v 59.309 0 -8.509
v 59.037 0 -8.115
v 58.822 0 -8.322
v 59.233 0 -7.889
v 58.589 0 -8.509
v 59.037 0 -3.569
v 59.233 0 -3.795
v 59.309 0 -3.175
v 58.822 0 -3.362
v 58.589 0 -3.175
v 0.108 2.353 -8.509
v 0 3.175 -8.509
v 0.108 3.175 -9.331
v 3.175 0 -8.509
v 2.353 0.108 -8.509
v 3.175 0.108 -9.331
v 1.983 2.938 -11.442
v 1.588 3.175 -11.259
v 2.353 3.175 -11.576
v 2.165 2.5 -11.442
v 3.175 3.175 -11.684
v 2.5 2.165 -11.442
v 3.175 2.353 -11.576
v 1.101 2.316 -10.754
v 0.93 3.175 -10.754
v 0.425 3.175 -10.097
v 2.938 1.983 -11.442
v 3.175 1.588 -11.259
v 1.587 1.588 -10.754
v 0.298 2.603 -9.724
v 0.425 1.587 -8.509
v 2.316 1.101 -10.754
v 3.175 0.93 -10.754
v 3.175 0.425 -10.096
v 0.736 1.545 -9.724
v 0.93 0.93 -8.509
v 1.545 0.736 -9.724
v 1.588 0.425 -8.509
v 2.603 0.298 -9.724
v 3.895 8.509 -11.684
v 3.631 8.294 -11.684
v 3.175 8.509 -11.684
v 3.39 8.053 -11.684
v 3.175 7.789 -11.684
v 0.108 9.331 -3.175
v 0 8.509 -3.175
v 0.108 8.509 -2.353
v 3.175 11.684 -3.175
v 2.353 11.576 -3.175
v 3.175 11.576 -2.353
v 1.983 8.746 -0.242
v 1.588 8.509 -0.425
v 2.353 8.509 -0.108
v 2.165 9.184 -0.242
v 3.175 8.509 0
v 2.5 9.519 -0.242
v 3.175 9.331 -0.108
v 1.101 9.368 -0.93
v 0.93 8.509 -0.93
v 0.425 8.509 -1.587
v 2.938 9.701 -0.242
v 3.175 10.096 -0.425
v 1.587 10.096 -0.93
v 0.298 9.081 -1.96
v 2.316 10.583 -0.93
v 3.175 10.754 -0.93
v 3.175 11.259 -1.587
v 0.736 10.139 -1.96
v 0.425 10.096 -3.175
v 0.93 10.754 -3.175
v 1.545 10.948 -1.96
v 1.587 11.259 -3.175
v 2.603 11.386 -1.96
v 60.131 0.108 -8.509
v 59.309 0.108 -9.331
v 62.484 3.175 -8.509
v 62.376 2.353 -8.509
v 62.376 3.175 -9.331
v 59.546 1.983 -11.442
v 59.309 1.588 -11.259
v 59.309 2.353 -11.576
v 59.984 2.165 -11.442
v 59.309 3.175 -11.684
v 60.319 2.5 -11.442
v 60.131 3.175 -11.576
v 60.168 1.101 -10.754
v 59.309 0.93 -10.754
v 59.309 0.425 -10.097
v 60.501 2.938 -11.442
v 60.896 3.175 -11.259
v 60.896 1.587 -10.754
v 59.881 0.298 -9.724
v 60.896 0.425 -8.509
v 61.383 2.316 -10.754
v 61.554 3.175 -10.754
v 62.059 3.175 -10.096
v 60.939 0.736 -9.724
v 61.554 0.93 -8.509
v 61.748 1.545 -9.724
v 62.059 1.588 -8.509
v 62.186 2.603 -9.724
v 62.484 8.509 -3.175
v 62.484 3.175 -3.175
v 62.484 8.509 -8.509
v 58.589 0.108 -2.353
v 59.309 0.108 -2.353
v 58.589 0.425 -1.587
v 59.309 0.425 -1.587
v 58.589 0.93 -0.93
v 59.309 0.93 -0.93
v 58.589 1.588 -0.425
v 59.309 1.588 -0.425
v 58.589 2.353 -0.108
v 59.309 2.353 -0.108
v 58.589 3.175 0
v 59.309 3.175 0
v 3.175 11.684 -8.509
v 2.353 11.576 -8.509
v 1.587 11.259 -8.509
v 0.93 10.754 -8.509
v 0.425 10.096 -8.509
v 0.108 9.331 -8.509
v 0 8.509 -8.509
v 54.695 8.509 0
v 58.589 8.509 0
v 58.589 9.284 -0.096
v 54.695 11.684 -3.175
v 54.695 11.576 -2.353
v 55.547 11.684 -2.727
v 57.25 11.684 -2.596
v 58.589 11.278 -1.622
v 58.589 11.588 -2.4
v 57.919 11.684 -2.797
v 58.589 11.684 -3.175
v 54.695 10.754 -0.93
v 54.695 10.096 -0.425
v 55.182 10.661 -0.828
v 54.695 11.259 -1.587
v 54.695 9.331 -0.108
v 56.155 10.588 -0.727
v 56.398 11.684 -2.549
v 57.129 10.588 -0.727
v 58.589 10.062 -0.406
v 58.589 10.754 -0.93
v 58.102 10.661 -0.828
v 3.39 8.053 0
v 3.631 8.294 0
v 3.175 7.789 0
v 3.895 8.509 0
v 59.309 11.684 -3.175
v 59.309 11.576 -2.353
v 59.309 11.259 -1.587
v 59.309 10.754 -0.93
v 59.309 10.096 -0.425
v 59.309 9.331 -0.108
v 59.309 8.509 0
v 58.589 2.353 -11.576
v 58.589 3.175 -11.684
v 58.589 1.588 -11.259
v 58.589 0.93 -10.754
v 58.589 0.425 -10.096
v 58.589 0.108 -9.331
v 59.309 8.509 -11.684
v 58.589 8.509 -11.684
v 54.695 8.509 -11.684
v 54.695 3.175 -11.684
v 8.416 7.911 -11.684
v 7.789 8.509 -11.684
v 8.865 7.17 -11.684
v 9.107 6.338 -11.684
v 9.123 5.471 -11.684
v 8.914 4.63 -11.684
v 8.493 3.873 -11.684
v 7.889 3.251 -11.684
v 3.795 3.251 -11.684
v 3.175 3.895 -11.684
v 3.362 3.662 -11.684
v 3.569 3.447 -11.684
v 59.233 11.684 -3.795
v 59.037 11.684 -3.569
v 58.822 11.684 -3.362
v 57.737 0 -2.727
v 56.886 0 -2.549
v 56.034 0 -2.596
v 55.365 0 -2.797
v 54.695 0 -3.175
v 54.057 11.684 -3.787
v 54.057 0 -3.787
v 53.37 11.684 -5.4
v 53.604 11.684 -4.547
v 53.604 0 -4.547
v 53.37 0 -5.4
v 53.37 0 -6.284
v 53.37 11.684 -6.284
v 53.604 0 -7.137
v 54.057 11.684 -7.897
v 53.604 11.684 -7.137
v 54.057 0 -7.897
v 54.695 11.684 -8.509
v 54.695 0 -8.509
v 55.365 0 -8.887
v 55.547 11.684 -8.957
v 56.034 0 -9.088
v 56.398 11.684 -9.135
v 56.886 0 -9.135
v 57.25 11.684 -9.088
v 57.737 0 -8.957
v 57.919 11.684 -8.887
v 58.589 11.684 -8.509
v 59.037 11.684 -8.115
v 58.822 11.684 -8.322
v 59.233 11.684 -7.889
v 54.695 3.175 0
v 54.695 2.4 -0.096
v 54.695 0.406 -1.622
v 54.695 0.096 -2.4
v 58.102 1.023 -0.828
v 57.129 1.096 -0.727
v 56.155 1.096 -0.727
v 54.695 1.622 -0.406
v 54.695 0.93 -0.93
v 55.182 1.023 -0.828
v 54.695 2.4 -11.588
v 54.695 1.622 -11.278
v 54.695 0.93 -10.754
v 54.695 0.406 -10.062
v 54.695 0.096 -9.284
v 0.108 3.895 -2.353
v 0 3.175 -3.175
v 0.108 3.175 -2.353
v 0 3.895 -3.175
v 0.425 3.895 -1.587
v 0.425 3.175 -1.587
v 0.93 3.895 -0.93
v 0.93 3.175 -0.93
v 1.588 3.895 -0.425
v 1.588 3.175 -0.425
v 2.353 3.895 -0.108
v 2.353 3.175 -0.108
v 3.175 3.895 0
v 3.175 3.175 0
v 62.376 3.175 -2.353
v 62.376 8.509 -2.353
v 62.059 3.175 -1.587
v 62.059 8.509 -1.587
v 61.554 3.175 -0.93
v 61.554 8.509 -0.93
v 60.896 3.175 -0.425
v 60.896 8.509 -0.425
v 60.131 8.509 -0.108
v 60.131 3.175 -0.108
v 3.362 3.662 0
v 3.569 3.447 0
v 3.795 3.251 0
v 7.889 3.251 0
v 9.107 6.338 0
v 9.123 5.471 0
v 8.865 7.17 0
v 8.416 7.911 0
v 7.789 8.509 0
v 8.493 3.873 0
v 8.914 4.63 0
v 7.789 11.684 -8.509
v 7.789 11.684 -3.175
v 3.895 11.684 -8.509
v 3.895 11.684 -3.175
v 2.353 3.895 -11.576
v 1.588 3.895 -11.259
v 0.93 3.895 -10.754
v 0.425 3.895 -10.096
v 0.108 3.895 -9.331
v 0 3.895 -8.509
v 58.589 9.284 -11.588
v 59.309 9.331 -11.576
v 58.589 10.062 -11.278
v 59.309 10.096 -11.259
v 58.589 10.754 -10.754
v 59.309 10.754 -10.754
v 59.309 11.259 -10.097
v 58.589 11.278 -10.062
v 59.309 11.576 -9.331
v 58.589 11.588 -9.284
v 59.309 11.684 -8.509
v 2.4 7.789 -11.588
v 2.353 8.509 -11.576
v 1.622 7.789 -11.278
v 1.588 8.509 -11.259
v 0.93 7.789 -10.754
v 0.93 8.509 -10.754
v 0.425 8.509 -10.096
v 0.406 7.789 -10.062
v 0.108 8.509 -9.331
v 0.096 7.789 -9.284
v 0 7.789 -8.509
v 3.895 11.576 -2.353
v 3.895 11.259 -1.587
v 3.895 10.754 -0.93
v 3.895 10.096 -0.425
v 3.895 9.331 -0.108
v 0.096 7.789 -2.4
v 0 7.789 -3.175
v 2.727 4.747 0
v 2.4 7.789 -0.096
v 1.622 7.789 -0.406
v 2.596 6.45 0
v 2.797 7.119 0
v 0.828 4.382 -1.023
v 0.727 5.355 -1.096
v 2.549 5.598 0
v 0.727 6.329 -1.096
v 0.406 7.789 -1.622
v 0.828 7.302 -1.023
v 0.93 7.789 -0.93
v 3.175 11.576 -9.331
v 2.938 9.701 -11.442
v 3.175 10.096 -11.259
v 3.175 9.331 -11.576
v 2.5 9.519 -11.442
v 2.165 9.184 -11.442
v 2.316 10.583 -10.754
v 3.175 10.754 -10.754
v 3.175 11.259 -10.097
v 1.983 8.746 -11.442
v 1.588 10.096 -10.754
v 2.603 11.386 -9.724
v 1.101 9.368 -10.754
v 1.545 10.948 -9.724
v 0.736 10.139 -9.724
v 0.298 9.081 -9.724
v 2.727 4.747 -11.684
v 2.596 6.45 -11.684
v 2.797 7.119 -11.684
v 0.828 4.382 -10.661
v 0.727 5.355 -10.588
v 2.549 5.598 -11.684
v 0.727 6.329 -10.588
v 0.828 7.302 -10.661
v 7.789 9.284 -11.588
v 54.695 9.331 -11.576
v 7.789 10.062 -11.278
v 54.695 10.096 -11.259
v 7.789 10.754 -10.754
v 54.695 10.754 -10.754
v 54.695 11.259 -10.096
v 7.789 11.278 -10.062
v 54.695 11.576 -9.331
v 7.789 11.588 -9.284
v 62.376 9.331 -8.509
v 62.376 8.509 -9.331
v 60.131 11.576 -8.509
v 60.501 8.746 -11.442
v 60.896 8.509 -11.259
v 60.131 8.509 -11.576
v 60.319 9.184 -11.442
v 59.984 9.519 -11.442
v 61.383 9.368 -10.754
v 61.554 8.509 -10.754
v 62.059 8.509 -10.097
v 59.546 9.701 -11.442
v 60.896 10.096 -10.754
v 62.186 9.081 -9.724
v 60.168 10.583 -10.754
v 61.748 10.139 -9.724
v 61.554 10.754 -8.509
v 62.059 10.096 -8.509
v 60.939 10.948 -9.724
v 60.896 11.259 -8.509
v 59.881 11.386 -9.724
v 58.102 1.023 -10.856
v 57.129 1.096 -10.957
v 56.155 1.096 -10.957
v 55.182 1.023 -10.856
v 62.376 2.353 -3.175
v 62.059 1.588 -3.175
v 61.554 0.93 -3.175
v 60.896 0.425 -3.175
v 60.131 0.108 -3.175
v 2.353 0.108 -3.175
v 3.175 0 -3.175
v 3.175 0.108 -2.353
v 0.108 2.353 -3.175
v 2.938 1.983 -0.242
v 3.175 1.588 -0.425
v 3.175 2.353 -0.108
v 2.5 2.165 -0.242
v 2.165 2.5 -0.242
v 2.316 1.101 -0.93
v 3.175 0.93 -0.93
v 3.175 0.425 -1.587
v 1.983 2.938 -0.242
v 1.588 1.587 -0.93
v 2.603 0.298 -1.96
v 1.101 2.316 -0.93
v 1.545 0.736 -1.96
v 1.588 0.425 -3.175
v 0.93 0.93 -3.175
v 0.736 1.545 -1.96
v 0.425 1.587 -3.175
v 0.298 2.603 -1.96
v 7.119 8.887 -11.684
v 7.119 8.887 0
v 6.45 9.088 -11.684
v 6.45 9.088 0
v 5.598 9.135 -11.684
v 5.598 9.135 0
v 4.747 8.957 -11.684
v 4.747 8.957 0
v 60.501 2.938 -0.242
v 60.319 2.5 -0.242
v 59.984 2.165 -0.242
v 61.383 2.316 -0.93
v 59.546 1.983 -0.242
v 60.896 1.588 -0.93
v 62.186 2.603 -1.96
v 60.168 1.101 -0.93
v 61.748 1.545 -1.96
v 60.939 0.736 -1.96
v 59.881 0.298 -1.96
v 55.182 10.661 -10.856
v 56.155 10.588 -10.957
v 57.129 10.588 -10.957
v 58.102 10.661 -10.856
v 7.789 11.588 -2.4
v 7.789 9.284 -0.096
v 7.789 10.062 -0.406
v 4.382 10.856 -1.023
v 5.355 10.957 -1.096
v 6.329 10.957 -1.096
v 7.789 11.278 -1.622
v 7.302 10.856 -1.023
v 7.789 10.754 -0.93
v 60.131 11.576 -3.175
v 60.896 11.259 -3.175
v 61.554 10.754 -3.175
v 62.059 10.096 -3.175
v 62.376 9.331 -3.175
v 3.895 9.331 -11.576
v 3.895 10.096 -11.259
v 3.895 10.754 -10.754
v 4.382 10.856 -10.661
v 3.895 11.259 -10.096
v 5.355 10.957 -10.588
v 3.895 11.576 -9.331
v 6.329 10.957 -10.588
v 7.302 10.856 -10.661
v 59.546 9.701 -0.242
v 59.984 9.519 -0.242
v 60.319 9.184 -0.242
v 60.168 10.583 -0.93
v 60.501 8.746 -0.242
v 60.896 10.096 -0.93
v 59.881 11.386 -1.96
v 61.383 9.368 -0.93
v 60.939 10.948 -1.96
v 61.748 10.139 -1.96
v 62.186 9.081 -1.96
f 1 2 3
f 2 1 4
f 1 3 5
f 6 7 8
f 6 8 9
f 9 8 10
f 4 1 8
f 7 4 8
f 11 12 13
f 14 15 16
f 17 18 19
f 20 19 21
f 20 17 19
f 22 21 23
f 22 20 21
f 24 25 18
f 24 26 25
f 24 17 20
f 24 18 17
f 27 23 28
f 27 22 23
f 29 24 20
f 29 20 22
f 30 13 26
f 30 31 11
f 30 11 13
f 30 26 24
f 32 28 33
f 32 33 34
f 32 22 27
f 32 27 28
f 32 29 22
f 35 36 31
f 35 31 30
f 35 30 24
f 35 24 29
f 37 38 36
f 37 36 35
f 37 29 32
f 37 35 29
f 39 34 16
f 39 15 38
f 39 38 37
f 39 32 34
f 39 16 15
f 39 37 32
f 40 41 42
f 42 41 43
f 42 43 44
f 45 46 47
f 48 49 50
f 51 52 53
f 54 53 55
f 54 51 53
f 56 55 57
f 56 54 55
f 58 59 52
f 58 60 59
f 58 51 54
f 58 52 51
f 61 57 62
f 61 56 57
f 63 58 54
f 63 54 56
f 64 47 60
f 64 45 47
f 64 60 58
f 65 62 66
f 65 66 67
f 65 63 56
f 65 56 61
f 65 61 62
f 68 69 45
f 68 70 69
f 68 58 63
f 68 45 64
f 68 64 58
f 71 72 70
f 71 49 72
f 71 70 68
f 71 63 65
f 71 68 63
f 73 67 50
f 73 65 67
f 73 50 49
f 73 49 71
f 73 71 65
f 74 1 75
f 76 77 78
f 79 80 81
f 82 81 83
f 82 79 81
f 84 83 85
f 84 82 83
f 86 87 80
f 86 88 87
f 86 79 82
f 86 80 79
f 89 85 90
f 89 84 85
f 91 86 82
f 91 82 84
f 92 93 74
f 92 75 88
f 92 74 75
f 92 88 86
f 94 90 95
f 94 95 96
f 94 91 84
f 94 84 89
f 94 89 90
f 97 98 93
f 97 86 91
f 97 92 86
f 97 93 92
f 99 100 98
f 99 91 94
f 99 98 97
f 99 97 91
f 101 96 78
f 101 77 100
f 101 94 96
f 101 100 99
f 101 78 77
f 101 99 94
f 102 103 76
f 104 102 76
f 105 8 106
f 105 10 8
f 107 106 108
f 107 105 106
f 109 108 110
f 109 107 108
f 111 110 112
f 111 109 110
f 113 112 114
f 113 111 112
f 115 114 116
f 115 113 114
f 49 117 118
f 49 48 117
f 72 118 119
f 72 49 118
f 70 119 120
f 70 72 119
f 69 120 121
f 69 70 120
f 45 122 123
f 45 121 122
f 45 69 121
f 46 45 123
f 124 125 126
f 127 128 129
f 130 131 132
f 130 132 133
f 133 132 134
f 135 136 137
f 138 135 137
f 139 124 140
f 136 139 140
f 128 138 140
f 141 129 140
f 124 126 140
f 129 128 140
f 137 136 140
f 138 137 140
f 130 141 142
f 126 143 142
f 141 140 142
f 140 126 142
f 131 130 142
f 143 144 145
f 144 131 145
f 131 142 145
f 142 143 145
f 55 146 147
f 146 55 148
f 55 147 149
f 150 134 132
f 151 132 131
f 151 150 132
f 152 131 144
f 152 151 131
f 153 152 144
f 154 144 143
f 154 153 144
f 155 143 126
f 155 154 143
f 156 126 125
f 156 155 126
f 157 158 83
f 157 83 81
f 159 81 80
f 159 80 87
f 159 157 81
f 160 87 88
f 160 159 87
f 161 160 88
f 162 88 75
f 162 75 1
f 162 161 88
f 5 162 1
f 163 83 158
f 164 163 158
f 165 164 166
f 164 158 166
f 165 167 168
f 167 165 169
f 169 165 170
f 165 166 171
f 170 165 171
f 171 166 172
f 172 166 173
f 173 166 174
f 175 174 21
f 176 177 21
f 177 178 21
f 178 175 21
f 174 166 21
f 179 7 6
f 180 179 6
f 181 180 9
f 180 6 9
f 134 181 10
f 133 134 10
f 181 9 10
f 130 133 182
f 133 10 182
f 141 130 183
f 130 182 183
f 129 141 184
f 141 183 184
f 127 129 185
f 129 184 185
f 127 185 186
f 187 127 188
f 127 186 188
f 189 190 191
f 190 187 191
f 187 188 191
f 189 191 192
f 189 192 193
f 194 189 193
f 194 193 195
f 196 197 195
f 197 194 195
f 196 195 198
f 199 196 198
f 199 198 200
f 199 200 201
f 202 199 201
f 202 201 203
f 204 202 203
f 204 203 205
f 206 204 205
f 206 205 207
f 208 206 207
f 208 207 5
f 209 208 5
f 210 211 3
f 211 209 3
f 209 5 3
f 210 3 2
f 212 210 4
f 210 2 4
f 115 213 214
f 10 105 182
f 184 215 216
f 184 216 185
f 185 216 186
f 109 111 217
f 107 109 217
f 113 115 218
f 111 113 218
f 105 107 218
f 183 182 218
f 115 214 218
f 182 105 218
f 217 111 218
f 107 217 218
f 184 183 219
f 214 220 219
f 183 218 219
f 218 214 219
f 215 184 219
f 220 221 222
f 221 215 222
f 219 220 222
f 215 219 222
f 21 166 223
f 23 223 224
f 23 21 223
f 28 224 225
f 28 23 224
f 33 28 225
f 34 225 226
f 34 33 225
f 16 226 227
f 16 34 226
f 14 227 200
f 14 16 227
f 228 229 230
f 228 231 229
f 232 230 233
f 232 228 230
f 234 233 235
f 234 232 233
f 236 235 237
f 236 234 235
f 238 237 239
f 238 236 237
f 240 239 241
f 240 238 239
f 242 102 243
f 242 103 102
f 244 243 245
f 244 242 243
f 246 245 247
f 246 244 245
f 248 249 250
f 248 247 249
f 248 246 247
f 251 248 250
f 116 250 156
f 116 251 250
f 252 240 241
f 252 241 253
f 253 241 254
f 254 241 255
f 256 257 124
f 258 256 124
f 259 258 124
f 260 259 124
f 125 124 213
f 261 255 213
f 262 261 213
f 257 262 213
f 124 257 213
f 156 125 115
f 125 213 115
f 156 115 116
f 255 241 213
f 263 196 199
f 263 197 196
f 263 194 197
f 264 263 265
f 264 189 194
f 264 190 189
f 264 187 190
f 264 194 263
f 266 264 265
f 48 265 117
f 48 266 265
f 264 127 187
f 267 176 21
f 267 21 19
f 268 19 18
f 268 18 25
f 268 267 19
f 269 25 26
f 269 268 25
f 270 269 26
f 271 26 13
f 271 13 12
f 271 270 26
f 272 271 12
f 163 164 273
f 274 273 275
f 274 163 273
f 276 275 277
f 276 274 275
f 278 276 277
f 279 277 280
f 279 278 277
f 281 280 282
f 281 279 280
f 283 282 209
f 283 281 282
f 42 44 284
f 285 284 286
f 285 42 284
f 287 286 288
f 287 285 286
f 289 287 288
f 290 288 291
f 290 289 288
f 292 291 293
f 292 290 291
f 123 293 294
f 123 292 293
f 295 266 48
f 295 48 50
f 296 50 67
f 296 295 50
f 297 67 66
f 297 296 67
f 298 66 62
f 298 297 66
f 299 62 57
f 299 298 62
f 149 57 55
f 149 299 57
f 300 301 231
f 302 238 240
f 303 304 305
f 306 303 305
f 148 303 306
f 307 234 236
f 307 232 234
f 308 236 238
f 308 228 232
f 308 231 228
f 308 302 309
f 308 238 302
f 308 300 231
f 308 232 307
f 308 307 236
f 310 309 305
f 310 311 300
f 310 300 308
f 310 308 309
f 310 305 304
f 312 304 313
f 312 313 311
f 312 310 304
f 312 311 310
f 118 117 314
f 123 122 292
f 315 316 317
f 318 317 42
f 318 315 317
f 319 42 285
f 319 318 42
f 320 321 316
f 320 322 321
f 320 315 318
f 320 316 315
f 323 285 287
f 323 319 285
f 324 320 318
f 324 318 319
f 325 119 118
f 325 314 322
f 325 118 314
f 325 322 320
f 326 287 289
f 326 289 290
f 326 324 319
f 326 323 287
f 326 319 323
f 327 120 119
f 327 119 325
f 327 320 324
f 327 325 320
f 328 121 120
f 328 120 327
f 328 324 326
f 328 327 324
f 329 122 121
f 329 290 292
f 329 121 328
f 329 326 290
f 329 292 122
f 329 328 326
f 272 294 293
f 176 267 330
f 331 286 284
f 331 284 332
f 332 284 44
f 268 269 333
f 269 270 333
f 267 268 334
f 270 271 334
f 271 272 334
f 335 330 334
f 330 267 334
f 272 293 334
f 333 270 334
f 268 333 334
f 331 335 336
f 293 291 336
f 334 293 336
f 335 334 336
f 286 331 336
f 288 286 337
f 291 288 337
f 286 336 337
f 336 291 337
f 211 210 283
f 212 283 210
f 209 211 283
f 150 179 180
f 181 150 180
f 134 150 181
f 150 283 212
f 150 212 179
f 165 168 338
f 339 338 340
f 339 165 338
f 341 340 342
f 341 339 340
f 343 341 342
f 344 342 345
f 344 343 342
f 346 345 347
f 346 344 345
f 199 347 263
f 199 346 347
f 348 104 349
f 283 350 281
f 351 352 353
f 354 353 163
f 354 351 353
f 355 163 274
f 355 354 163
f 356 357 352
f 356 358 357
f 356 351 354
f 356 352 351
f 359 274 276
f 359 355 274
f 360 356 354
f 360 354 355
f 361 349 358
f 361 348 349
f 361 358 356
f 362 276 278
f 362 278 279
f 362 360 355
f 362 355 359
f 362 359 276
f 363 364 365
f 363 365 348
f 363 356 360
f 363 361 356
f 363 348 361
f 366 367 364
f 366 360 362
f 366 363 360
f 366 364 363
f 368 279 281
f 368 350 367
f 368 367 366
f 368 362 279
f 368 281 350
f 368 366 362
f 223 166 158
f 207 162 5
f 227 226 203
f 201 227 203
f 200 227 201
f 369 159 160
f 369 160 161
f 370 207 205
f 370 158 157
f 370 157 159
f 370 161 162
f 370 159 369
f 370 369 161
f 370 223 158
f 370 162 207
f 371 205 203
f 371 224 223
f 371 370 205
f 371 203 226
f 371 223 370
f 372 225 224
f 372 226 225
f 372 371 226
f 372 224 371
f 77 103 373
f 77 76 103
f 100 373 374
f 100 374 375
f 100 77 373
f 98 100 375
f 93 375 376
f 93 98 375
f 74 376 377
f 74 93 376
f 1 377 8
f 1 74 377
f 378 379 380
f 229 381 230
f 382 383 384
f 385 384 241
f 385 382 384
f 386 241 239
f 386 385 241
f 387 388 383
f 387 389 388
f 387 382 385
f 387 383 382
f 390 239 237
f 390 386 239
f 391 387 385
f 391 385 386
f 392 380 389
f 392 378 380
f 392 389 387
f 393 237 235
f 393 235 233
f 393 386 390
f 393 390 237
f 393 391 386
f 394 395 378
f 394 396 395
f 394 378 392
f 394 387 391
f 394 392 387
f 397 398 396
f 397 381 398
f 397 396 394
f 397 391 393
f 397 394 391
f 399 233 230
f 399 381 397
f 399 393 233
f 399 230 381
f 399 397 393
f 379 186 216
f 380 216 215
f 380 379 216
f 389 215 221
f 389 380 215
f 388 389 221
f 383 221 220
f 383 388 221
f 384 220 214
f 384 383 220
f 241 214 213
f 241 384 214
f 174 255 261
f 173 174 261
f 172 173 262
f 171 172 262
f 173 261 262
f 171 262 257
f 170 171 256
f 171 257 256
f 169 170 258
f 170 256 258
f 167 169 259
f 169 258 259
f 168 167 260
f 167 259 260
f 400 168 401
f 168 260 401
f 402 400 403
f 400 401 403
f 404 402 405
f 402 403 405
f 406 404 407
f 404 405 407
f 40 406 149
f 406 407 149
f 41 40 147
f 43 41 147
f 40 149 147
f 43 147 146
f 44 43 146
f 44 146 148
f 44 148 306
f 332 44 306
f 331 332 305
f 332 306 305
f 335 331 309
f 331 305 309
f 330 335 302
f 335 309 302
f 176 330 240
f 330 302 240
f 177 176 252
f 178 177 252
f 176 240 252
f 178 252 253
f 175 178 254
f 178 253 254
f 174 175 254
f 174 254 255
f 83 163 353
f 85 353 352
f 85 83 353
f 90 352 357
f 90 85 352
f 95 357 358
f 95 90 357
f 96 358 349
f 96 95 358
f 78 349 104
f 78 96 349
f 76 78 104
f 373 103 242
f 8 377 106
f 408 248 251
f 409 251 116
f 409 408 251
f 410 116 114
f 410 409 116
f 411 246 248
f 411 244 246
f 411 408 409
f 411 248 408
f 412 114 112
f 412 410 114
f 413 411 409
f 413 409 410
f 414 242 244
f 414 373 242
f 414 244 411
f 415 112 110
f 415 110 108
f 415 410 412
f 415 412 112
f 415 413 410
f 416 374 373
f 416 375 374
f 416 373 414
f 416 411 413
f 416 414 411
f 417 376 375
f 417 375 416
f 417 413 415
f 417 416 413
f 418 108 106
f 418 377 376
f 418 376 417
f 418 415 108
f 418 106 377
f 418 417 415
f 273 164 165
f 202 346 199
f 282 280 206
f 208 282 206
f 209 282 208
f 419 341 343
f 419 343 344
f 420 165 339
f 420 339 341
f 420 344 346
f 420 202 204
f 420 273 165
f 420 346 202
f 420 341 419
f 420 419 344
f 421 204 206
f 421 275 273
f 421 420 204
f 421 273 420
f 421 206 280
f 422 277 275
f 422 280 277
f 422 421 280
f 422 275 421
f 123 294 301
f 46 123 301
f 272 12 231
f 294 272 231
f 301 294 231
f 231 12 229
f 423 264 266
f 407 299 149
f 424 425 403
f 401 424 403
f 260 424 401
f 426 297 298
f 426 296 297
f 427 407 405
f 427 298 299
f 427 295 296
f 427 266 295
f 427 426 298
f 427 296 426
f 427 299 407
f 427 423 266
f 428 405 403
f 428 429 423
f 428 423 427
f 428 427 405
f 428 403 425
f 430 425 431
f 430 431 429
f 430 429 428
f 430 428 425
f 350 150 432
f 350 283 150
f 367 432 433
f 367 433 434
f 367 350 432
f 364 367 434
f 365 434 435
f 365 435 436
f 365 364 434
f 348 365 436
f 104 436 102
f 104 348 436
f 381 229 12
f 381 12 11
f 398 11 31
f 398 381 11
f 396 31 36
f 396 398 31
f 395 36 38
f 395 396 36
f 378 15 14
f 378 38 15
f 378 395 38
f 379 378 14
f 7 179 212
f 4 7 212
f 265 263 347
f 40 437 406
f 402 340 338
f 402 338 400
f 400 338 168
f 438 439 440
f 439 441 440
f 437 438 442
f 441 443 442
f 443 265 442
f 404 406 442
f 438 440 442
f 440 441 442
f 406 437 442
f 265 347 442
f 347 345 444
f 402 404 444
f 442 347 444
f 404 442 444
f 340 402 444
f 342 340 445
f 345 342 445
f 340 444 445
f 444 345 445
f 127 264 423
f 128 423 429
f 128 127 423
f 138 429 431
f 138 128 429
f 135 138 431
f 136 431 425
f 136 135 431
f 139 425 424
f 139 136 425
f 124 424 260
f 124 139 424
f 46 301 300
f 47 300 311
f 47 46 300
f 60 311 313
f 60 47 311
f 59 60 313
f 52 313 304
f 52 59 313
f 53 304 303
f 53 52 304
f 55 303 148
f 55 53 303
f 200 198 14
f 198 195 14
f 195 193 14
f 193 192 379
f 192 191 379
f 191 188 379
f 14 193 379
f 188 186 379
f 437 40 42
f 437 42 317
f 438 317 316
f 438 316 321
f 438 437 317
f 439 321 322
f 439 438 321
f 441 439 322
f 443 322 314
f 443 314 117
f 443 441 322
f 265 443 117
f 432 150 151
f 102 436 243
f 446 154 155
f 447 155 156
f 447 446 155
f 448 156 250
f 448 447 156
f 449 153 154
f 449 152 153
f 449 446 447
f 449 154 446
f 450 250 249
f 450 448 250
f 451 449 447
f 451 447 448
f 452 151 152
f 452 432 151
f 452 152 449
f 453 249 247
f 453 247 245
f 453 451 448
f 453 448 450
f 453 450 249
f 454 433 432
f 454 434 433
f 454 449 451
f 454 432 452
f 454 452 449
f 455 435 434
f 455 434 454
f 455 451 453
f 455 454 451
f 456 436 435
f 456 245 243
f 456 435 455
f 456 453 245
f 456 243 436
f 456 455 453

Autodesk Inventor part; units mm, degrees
ref_plane "YZ Plane" through (0, 0, 0) normal (1, 0, 0) x (0, 1, 0)
ref_plane "XZ Plane" through (0, 0, 0) normal (0, 1, 0) x (-1, 0, 0)
ref_plane "XY Plane" through (0, 0, 0) normal (0, 0, 1) x (1, 0, 0)
sketch "Sketch1" plane through (0, 0, 0) normal (0, 1, 0) x (-1, 0, 0)
  line L0 (0, 0) -> (-62.484, 0)
  line L1 (-62.484, 0) -> (-62.484, -11.684)
  line L2 (-62.484, -11.684) -> (0, -11.684)
  line L3 (0, -11.684) -> (0, 0)
  arc A0 (-59.2328, -7.8892) -> (-59.2328, -3.7948) centre (-56.642, -5.842) ccw
  line L4 (-59.2328, -3.7948) -> (-59.2328, -7.8892)
  dimension "d0" = 62.484
  dimension "d1" = 11.684
  dimension "d2" = 6.604
  dimension "d3" = 5.842
  dimension "d4" = 5.842
  dimension "d5" = 5.842
  dimension "d6" = 2.5908
extrude "Extrusion1" add sketch "Sketch1" along normal blind 11.684
sketch "Sketch3" plane through (0, 0, 0) normal (0, 0, 1) x (1, 0, 0)
  arc A0 (7.8892, 3.2512) -> (3.7948, 3.2512) centre (5.842, 5.842) ccw
  line L0 (0, 0) -> (0, 11.684) projected
  line L1 (0, 0) -> (62.484, 0) projected
  line L2 (3.7948, 3.2512) -> (7.8892, 3.2512)
  dimension "d9" = 6.604
  dimension "d10" = 5.842
  dimension "d11" = 5.842
  dimension "d12" = 2.5908
extrude "Extrusion2" cut sketch "Sketch3" against normal blind 11.684
fillet "Fillet1" radius 3.175 4 edges at (0, 11.684, -5.842) (0, 0, -5.842) (62.484, 11.684, -5.842) (62.484, 0, -5.842)
fillet "Fillet2" radius 3.175 16 edges at (61.5541, 10.7541, -11.684) (31.242, 11.684, -11.684) (0.9299, 10.7541, -11.684) (0, 5.842, -11.684) (0.9299, 0.9299, -11.684) (31.242, 0, -11.684) (61.5541, 0.9299, -11.684) (62.484, 5.842, -11.684) (61.5541, 10.7541, 0) (62.484, 5.842, 0) (61.5541, 0.9299, 0) (31.242, 0, 0) (0.9299, 0.9299, 0) (0, 5.842, 0) (0.9299, 10.7541, 0) (31.242, 11.684, 0)
properties part number "Carrier arm"
